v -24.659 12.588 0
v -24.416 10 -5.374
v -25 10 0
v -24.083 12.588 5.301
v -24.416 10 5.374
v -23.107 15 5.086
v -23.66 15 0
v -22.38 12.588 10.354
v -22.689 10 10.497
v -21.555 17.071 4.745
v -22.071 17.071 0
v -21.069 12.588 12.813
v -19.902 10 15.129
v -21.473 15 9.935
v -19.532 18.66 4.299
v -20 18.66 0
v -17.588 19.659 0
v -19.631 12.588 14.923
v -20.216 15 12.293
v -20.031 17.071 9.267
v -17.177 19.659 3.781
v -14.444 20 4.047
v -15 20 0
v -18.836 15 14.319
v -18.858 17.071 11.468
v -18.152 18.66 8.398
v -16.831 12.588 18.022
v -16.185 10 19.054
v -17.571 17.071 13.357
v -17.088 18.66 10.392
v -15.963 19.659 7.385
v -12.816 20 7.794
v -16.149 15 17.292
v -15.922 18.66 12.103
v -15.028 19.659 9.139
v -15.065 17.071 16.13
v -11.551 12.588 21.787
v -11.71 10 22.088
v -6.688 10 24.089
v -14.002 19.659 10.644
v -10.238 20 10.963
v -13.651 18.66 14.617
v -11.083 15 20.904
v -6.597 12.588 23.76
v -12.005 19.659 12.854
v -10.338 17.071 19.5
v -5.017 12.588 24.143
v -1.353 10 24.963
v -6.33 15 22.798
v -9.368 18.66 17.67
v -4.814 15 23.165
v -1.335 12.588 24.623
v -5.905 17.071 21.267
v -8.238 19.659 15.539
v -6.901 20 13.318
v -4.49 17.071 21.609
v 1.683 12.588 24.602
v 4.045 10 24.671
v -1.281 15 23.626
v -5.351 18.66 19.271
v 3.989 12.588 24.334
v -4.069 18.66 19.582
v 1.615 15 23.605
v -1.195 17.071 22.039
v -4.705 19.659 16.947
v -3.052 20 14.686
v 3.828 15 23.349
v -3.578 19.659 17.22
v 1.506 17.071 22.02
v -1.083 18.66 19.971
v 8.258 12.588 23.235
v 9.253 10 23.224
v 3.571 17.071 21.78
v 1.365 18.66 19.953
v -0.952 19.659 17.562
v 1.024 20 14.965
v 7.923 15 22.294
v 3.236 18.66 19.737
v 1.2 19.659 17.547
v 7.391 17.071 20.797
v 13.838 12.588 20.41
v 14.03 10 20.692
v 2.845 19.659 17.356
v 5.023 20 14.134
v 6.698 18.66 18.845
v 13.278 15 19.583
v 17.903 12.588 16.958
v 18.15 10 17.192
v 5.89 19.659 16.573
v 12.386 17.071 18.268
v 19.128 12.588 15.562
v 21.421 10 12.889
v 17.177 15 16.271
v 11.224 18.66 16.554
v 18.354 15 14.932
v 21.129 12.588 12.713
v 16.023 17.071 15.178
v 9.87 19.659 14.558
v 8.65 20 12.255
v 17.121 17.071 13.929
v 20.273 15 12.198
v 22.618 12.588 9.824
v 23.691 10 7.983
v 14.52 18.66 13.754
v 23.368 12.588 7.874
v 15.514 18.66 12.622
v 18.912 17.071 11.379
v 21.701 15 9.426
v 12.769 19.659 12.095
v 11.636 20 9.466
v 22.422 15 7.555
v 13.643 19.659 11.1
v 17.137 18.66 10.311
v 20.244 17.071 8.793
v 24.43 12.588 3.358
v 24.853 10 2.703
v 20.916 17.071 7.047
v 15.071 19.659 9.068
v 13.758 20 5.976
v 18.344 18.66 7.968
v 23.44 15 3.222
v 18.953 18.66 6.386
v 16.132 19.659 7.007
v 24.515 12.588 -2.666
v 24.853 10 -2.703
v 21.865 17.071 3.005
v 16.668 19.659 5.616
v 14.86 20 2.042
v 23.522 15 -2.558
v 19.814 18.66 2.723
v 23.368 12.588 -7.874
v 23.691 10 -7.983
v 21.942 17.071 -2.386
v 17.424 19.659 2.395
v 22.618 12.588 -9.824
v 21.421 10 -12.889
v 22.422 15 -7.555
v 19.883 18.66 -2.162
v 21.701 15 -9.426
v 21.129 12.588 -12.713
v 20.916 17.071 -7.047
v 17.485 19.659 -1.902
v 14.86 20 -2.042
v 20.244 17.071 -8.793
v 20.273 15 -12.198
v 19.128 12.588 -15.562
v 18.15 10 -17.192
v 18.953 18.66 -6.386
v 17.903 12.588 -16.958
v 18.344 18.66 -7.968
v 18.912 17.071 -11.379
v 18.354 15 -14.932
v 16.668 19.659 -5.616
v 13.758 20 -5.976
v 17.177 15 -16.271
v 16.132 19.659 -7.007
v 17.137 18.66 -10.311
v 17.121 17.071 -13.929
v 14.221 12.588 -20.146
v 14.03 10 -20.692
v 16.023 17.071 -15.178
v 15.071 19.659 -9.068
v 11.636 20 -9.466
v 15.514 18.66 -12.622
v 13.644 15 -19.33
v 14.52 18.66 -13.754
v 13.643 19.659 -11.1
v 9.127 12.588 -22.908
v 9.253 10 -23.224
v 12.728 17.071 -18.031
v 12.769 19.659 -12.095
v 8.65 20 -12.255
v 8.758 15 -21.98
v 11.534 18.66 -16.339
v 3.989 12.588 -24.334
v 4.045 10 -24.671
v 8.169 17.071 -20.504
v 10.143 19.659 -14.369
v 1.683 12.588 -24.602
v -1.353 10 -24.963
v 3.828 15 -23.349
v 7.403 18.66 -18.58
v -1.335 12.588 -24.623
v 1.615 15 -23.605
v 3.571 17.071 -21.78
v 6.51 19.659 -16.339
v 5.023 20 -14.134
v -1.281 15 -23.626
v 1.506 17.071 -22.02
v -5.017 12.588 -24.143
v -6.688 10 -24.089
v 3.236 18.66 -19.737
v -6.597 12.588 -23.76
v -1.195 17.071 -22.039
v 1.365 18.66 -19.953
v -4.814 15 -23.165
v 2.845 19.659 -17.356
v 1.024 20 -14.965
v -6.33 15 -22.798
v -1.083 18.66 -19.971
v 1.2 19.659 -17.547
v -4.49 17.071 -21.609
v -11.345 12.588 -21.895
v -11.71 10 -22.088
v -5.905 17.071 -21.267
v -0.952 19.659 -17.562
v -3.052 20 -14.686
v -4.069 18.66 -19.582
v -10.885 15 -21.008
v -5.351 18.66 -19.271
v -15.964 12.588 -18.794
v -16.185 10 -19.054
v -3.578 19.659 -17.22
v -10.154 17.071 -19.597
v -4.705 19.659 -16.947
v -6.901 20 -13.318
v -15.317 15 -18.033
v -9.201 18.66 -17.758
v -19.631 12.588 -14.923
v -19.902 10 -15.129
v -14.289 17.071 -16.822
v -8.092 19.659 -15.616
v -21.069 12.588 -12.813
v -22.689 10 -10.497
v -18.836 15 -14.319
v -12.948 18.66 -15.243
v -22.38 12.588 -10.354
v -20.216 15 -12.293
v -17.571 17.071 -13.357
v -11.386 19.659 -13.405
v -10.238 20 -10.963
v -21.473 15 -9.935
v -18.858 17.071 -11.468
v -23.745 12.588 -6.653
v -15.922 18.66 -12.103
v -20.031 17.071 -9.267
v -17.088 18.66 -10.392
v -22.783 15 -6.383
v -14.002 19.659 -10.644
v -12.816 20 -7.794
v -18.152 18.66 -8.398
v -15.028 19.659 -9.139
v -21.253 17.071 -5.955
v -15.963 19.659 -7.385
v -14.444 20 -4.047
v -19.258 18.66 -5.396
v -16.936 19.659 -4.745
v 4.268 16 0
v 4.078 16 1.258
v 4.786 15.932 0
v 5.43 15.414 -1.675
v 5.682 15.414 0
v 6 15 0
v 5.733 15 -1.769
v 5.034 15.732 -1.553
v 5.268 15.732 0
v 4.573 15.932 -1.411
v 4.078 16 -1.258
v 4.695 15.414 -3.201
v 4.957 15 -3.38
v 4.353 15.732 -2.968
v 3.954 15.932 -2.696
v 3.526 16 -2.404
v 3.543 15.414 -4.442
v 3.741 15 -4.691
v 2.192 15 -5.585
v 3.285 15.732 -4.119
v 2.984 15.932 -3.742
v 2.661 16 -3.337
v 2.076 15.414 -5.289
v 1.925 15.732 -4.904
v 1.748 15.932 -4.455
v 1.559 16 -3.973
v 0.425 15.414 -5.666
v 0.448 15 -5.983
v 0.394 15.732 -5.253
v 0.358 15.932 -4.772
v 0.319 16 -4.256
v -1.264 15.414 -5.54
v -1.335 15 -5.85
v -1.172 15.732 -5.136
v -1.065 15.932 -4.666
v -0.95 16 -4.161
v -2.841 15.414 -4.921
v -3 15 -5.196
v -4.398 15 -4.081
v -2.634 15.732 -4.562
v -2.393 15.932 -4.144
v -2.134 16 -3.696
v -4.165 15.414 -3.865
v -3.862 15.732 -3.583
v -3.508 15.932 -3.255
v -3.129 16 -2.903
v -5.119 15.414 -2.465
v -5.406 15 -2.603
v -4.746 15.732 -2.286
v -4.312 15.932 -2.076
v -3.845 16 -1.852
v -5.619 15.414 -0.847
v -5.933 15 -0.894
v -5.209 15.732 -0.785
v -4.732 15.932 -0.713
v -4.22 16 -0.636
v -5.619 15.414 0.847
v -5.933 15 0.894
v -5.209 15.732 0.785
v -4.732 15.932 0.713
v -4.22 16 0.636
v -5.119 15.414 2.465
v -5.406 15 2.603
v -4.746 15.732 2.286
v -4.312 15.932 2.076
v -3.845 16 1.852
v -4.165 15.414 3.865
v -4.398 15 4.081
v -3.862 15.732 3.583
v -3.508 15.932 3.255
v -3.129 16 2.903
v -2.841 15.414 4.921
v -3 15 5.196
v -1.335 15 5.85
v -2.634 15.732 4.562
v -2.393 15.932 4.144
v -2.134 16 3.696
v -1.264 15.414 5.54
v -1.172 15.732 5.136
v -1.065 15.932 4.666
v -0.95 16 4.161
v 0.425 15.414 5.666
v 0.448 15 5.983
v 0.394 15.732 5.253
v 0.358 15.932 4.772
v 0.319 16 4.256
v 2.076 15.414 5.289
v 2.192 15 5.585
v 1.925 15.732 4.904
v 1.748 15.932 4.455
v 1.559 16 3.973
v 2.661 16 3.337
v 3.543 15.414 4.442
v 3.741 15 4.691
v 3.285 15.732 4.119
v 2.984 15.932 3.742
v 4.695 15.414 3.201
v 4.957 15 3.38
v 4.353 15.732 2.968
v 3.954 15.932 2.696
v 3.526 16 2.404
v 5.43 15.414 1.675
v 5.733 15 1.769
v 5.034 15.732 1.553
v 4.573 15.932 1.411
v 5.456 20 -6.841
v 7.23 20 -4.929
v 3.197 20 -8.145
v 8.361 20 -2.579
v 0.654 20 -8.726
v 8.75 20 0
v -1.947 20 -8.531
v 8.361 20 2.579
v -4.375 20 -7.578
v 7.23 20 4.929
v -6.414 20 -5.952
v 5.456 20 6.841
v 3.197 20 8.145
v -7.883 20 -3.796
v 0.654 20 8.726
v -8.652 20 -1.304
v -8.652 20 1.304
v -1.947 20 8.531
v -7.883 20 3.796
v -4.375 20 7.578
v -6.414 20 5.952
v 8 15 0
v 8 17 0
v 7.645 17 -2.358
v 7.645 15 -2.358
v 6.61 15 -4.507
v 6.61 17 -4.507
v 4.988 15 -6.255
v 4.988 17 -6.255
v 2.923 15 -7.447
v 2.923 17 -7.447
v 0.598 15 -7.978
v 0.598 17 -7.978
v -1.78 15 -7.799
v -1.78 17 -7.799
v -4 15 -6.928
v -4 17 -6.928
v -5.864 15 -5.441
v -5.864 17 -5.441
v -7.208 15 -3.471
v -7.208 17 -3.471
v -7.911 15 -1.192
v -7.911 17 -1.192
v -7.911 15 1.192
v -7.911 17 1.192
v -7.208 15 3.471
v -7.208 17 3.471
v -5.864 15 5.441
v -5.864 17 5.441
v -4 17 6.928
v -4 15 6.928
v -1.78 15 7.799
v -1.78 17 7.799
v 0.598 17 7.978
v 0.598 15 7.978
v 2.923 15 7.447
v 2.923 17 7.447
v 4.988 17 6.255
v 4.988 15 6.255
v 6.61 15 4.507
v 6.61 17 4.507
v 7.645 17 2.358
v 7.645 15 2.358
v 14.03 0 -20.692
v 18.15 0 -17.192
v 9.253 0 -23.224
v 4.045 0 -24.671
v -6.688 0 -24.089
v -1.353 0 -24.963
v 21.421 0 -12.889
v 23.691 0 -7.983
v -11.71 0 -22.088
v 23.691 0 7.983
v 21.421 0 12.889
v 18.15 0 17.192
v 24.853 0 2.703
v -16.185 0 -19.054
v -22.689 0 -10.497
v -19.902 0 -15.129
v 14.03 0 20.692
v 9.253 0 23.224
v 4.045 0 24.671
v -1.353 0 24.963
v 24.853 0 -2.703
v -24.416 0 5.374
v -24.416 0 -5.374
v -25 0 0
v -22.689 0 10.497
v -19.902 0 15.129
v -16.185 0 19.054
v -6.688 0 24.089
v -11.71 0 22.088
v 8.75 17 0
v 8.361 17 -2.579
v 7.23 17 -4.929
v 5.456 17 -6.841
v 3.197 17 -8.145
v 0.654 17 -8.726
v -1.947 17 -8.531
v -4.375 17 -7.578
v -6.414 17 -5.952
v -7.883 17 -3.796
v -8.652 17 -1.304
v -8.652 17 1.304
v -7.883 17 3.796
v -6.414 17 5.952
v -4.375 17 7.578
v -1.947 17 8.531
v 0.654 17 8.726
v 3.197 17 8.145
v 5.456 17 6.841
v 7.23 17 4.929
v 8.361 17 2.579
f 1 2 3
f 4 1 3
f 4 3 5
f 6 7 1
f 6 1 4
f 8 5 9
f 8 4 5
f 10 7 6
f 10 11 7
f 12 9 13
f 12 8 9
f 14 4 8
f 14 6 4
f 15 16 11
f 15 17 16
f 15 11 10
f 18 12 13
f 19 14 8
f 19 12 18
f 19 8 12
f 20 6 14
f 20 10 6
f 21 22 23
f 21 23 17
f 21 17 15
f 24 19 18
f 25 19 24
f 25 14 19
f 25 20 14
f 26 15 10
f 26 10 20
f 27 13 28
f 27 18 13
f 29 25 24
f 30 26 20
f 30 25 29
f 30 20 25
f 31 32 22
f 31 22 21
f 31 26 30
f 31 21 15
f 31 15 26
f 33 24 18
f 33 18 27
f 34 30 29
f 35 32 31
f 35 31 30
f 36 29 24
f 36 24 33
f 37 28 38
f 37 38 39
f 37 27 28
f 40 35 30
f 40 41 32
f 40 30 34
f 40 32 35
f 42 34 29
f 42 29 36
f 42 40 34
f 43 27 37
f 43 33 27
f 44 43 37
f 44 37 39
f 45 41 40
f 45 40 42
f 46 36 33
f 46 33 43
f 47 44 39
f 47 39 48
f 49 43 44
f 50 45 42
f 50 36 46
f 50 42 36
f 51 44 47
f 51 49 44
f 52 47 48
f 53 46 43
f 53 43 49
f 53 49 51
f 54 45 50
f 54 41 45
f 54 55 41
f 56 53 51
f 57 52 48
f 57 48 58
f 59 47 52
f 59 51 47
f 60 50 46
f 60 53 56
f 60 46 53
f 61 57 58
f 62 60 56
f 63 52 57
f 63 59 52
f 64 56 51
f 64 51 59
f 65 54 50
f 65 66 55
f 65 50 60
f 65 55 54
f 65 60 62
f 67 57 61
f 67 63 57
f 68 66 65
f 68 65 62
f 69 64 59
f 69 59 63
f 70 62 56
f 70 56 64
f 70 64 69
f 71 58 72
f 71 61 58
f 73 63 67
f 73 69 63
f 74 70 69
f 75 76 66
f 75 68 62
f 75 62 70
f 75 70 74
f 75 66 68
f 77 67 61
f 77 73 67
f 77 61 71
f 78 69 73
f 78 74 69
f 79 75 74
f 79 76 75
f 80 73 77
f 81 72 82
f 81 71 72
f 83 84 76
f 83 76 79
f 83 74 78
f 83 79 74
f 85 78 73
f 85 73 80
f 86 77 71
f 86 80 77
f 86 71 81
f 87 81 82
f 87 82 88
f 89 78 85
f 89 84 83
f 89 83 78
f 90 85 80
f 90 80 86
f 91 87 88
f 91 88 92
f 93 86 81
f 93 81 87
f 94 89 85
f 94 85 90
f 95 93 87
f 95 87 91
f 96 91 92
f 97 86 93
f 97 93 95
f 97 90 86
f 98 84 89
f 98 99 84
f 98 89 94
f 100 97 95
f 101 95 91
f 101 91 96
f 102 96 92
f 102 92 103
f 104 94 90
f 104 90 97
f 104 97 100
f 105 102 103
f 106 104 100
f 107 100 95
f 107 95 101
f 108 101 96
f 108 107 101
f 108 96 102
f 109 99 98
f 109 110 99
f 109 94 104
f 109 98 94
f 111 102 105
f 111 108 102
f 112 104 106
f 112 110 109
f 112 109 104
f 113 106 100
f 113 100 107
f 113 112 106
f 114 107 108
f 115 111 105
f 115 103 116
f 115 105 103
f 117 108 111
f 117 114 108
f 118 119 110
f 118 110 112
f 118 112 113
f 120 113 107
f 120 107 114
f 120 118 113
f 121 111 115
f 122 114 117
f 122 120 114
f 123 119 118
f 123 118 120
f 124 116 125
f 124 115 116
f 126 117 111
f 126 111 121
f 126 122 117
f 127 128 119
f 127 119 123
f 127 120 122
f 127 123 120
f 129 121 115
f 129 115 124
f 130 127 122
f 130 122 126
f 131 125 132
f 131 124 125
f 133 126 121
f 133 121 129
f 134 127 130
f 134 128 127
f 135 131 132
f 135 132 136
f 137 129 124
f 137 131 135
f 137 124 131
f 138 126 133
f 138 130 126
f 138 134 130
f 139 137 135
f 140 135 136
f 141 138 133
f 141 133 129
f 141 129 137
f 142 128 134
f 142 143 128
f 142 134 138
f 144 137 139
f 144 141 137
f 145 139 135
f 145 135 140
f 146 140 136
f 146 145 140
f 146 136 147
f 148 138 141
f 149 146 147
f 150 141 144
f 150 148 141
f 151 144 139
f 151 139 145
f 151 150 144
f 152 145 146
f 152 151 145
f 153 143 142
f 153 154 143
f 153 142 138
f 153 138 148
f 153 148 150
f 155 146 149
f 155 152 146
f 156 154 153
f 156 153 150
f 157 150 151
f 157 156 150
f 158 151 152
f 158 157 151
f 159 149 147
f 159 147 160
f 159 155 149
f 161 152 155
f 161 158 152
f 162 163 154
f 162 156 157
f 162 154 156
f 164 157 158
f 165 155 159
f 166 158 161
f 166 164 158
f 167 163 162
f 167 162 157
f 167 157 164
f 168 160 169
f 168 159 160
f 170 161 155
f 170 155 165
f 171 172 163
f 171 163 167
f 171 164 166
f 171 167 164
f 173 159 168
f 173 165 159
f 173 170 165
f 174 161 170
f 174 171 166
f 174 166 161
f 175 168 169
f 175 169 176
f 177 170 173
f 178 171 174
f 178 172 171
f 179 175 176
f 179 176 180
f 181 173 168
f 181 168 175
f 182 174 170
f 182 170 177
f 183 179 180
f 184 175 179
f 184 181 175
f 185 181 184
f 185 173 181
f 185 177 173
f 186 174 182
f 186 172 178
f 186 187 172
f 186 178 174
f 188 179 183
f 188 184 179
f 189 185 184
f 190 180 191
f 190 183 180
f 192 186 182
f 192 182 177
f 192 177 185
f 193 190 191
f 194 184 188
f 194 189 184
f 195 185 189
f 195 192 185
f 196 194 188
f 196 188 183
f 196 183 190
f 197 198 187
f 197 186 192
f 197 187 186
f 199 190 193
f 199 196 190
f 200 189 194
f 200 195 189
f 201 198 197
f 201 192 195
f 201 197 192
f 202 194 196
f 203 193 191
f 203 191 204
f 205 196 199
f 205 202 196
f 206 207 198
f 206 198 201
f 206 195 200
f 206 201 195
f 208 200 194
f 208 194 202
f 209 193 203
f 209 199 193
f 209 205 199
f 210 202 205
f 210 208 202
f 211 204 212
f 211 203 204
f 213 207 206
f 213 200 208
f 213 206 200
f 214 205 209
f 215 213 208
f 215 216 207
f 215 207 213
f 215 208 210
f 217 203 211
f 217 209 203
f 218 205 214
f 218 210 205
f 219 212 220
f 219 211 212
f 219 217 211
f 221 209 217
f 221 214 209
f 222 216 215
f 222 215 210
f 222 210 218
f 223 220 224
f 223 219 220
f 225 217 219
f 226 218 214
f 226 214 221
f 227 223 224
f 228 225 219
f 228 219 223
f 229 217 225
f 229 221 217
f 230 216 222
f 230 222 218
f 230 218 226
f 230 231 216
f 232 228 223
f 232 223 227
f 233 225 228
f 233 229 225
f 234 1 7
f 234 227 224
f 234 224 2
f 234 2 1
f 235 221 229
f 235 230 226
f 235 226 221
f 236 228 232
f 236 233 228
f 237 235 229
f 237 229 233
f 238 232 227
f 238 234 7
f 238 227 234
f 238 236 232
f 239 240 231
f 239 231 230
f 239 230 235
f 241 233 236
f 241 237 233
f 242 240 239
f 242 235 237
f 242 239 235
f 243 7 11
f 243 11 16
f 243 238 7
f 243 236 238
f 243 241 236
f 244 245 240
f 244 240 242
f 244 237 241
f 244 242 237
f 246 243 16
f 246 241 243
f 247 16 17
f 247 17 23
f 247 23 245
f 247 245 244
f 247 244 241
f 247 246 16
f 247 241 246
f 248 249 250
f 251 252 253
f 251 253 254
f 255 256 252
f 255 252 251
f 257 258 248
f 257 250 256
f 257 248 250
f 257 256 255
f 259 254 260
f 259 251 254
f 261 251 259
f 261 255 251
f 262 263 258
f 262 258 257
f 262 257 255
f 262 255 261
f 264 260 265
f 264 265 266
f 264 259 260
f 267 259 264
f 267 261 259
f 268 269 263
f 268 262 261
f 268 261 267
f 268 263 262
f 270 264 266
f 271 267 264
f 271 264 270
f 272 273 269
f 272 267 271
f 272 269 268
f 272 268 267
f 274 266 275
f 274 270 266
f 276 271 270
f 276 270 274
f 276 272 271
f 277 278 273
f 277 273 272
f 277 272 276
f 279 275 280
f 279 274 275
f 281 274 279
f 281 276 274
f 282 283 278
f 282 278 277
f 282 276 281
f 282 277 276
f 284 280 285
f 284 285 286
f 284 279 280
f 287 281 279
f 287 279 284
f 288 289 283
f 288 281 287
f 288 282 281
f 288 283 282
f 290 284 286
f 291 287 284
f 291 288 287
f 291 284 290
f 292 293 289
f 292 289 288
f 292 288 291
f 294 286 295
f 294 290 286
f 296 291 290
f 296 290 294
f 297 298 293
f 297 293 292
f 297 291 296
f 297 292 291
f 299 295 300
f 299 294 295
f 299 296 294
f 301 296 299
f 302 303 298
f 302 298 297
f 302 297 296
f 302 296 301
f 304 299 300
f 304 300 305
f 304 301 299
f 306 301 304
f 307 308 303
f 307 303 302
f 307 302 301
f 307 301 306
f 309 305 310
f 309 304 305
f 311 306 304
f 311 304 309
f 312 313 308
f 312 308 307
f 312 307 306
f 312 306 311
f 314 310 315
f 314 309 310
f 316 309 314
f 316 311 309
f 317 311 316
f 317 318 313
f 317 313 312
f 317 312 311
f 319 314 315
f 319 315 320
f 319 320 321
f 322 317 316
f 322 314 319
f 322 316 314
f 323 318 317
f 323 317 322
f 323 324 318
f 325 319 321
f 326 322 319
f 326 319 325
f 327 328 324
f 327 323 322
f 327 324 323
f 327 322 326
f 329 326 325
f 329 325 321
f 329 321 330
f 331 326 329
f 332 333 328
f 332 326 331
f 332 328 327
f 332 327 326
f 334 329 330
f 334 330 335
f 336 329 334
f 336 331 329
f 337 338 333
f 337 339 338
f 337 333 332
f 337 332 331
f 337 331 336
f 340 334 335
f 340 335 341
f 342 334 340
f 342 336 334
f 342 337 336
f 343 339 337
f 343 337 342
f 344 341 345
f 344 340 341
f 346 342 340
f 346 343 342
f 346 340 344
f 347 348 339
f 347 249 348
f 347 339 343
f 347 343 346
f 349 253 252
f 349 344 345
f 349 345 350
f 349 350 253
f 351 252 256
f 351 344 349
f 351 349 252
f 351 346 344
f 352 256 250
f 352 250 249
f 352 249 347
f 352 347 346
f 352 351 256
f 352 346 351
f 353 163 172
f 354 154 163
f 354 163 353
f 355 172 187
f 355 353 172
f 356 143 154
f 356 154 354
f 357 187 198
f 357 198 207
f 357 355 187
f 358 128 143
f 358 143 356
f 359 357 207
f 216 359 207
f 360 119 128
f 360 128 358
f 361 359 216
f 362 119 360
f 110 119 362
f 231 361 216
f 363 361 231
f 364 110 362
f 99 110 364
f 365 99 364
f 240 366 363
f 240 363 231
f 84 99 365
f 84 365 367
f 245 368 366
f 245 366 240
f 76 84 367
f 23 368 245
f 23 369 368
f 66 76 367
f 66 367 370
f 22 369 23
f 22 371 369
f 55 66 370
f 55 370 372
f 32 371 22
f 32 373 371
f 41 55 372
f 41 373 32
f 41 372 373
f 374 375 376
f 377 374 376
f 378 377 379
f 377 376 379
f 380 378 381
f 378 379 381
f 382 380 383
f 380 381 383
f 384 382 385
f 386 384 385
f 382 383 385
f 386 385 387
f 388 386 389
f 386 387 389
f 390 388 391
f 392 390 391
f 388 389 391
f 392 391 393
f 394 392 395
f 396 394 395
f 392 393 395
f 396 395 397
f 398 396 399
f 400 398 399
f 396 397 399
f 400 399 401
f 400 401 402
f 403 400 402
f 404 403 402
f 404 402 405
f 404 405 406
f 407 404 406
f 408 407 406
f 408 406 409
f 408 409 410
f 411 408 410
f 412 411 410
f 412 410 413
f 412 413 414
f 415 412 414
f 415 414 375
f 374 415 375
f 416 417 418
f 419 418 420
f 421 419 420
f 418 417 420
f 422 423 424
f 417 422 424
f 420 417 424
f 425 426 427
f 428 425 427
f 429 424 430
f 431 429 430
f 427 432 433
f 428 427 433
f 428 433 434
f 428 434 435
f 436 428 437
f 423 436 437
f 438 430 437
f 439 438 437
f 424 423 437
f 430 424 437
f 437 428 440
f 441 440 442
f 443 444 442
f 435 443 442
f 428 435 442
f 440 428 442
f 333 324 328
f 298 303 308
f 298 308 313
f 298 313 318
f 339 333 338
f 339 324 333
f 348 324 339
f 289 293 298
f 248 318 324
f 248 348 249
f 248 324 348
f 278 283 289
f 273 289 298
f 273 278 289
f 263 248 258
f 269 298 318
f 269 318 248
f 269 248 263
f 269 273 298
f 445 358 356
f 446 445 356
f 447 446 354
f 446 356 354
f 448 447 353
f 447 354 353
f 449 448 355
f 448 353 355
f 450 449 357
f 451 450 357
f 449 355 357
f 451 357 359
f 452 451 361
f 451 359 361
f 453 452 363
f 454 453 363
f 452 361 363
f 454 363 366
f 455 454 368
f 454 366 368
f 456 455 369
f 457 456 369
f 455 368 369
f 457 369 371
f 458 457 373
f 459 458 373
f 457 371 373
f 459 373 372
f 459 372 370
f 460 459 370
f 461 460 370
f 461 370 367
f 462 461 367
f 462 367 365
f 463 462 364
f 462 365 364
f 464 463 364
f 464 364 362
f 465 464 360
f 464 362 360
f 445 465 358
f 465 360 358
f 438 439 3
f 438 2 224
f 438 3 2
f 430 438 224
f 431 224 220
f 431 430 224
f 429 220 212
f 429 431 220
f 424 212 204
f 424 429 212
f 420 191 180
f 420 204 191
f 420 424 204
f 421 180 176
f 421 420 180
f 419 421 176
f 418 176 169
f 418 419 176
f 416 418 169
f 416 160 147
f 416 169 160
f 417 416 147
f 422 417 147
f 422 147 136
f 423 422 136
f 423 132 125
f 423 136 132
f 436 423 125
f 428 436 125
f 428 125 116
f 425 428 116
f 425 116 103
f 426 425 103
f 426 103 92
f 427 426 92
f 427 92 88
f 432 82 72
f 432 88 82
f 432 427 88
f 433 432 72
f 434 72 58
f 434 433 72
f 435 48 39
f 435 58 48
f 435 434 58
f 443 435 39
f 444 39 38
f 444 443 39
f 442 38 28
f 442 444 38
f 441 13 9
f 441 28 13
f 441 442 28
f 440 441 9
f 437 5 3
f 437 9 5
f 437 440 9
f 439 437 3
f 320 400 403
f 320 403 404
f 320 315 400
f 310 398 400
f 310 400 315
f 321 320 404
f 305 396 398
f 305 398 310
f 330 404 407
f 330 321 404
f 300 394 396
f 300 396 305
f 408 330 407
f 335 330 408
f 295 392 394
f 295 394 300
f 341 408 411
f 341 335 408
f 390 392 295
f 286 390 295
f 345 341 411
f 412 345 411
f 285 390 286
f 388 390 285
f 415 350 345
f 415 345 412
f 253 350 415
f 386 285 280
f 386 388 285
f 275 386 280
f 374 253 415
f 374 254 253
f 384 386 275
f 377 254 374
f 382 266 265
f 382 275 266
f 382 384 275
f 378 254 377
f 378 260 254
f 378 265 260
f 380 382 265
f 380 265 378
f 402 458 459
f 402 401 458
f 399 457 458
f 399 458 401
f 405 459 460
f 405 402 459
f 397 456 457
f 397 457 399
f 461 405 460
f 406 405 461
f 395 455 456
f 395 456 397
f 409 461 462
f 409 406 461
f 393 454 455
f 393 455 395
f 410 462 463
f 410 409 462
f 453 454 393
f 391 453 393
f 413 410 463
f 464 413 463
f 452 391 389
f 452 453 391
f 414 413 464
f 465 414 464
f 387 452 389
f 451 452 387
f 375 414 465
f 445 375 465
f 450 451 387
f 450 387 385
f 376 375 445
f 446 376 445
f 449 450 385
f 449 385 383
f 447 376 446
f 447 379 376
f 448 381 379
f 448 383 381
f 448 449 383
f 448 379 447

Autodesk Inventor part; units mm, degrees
ref_plane "YZ Plane" through (0, 0, 0) normal (1, 0, 0) x (0, 1, 0)
ref_plane "XZ Plane" through (0, 0, 0) normal (0, 1, 0) x (-1, 0, 0)
ref_plane "XY Plane" through (0, 0, 0) normal (0, 0, 1) x (1, 0, 0)
sketch "Sketch1" plane through (0, 0, 0) normal (0, 1, 0) x (-1, 0, 0)
  circle A0 centre (0, 0) radius 25
  dimension "d0" = 50
extrude "Extrusion1" add sketch "Sketch1" along normal blind 20
fillet "Fillet1" radius 10 1 edges at (25, 20, 0)
sketch "Sketch2" plane through (0, 20, 0) normal (0, 1, 0) x (1, 0, 0)
  circle A0 centre (0, 0) radius 8.75
  dimension "d4" = 17.5
extrude "Extrusion2" cut sketch "Sketch2" against normal blind 3
sketch "Sketch3" plane through (0, 17, 0) normal (0, 1, 0) x (1, 0, 0)
  circle A0 centre (0, 0) radius 8
  dimension "d7" = 16
extrude "Extrusion3" cut sketch "Sketch3" against normal blind 2
sketch "Sketch5" plane through (0, 15, 0) normal (0, 1, 0) x (1, 0, 0)
  circle A0 centre (0, 0) radius 6
  dimension "d10" = 12
extrude "Extrusion4" add sketch "Sketch5" along normal blind 1
fillet "Fillet2" radius 2 1 edges at (-6, 16, 0)
properties part number "camera"
